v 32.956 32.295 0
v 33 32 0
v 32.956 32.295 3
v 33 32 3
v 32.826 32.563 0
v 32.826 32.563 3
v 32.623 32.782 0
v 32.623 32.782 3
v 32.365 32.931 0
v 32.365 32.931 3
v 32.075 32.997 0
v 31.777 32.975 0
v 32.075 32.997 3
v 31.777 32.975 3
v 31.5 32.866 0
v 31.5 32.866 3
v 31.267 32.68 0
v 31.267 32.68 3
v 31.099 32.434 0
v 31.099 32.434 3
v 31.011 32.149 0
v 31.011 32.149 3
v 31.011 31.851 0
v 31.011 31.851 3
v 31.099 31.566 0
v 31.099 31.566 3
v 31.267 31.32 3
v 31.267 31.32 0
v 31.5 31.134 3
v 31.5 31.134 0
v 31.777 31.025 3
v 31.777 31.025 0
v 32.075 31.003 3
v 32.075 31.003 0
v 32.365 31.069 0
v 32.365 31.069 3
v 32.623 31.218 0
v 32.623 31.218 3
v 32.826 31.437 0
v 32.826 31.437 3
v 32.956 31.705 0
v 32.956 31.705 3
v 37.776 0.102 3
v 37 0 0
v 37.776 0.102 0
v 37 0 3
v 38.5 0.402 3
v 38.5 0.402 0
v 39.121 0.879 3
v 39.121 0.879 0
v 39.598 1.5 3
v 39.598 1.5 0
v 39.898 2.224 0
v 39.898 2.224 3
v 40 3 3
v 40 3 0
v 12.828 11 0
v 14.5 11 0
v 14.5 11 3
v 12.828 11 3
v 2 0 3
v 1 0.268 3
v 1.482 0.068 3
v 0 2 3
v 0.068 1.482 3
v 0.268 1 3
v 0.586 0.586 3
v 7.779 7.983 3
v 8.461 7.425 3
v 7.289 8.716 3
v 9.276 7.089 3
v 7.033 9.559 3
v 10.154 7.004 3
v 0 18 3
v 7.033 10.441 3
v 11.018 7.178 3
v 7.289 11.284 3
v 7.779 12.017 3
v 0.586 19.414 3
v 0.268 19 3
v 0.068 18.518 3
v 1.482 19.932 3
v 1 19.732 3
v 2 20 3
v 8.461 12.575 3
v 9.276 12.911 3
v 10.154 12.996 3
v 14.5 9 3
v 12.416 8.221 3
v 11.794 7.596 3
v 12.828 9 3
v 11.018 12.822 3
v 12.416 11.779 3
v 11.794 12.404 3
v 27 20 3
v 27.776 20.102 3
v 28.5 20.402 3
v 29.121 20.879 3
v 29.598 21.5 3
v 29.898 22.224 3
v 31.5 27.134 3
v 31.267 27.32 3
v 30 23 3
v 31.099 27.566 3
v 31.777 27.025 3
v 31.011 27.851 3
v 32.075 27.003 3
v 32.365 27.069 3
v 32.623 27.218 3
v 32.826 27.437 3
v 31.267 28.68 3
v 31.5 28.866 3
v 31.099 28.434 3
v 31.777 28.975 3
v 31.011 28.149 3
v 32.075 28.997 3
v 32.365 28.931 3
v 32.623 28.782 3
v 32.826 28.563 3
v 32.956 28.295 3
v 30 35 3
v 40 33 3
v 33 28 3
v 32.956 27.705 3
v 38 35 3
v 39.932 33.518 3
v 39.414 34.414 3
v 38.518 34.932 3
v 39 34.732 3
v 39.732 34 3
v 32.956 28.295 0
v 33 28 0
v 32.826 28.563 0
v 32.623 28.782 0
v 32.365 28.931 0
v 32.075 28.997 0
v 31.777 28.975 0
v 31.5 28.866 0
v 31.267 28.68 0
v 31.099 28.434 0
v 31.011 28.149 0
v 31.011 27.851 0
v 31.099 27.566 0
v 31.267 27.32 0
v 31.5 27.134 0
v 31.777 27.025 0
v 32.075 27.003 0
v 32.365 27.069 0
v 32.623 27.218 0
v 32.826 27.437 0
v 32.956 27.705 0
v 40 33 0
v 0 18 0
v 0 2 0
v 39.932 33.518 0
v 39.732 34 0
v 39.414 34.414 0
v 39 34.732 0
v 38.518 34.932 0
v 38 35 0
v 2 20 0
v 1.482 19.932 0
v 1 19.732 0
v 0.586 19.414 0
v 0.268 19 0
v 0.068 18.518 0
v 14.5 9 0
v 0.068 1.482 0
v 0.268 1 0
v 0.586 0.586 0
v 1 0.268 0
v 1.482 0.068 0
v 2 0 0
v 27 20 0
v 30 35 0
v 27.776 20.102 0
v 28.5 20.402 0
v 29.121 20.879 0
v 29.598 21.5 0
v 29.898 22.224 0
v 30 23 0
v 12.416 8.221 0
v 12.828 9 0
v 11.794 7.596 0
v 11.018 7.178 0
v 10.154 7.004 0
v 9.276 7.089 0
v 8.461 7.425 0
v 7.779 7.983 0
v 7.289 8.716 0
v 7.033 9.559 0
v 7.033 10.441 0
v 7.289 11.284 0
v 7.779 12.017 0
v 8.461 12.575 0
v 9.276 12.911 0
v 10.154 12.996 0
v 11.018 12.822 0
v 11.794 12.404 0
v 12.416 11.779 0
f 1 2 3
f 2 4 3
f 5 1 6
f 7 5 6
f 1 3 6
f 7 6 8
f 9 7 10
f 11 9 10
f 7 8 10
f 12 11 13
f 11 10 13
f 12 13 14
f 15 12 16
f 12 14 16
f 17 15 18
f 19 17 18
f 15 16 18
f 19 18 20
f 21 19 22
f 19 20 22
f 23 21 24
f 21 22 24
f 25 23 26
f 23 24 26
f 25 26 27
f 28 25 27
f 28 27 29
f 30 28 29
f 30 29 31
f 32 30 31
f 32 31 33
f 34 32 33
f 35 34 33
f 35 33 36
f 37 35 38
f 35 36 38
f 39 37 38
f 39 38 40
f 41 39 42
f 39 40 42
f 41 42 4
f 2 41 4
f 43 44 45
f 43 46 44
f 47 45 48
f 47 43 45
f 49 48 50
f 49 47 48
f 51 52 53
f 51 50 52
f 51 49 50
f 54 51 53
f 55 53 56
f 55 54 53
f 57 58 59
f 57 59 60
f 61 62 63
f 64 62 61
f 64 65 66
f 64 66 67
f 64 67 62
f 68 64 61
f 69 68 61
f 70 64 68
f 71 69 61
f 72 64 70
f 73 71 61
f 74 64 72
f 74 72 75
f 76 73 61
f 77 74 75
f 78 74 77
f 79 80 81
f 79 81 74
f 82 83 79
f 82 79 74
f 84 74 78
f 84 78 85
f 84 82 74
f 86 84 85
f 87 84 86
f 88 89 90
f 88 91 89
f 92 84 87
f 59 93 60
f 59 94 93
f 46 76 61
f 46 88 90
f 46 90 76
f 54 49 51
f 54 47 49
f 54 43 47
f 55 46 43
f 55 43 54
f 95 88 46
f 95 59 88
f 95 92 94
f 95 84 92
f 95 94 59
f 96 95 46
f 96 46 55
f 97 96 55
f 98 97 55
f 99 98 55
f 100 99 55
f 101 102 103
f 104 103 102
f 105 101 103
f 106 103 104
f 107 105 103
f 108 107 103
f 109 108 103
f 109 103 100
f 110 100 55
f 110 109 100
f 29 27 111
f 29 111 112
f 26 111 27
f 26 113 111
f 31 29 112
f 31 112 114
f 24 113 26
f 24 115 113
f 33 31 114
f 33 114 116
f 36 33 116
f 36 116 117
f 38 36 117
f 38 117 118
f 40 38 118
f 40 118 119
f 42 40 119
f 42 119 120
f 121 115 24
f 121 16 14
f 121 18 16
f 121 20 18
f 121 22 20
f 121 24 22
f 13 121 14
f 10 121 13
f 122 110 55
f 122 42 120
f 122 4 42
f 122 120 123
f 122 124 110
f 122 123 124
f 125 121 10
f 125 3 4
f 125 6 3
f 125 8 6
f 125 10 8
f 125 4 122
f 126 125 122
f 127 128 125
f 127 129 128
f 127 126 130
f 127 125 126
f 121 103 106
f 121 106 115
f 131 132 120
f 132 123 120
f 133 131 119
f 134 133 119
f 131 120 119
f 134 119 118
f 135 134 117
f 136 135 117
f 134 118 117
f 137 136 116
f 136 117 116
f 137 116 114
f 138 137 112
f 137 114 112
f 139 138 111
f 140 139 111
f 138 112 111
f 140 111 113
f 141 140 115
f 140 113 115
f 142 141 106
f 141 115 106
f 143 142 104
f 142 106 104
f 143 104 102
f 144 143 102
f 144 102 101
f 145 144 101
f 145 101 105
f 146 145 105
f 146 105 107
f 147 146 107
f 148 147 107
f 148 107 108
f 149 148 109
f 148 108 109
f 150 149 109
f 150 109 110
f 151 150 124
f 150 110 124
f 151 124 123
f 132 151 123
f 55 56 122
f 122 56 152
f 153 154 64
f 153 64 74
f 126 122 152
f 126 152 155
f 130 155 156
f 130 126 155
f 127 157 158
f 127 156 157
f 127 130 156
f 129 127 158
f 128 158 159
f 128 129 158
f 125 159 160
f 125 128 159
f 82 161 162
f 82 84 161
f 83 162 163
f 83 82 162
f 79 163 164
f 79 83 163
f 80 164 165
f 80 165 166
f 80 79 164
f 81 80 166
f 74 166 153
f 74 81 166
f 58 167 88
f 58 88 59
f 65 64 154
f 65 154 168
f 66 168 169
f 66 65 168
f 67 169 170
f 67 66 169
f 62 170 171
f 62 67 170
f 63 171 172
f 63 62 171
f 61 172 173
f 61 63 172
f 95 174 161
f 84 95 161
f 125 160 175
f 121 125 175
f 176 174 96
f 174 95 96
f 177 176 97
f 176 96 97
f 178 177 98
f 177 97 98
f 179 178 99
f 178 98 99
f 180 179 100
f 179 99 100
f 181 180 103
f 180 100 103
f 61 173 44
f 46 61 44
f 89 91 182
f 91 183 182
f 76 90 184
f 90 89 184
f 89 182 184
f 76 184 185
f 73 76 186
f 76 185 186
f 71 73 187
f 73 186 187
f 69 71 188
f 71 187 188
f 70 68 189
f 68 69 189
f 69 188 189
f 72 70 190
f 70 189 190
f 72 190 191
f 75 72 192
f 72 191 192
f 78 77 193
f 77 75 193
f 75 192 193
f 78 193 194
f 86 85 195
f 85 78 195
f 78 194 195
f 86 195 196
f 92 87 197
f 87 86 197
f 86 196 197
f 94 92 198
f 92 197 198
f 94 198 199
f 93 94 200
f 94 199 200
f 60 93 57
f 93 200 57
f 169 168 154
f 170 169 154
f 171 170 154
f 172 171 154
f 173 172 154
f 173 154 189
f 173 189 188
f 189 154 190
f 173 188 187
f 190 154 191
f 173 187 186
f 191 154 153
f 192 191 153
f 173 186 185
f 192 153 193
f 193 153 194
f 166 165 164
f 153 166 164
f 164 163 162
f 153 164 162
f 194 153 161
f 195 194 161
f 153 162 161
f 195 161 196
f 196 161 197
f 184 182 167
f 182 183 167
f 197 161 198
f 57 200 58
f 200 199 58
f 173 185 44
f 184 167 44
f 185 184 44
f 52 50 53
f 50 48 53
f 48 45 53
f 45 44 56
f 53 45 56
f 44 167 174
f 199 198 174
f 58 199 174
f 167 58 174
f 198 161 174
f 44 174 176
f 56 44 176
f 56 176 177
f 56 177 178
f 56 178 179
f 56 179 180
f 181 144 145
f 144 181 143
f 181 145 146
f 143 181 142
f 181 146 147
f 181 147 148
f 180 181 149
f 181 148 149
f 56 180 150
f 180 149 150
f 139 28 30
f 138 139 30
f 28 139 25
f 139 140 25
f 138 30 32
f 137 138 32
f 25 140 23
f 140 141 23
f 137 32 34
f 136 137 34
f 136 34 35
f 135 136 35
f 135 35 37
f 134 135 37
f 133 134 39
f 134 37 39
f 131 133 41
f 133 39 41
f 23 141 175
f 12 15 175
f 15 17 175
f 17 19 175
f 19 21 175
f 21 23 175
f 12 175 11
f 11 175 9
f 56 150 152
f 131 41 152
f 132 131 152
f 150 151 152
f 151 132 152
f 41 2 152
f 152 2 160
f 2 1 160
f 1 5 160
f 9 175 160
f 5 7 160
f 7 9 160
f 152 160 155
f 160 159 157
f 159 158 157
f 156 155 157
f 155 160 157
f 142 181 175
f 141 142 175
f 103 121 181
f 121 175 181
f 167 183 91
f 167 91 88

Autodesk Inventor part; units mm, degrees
ref_plane "YZ Plane" through (0, 0, 0) normal (1, 0, 0) x (0, 1, 0)
ref_plane "XZ Plane" through (0, 0, 0) normal (0, 1, 0) x (-1, 0, 0)
ref_plane "XY Plane" through (0, 0, 0) normal (0, 0, 1) x (1, 0, 0)
sketch "スケッチ1" plane through (0, 0, 0) normal (0, 0, 1) x (1, 0, 0)
  line L0 (0, 0) -> (0, 20)
  line L1 (0, 0) -> (40, 0)
  line L2 (40, 0) -> (40, 35)
  line L3 (40, 35) -> (30, 35)
  line L4 (30, 35) -> (30, 20)
  line L5 (30, 20) -> (0, 20)
  circle A0 centre (10, 10) radius 3
  line L6 (10, 10) -> (10, 9)
  line L7 (10, 10) -> (10, 11)
  line L8 (10, 9) -> (14.5, 9)
  line L9 (14.5, 9) -> (14.5, 11)
  line L10 (14.5, 11) -> (10, 11)
  point P0 (12.8284, 9)
  point P1 (12.8284, 11)
  dimension "d0" = 20
  dimension "d1" = 40
  dimension "d2" = 35
  dimension "d3" = 10
  dimension "d4" = 6
  dimension "d6" = 1
  dimension "d7" = 1
  dimension "d8" = 4.5
extrude "押し出し1" add sketch "スケッチ1" along normal blind 3
fillet "フィレット1" radius 3 2 edges at (30, 20, 1.5) (40, 0, 1.5)
fillet "フィレット2" radius 2 2 edges at (0, 20, 1.5) (0, 0, 1.5)
fillet "フィレット3" radius 2 1 edges at (40, 35, 1.5)
sketch "スケッチ3" plane through (0, 0, 3) normal (0, 0, 1) x (1, 0, 0)
  circle A0 centre (32, 28) radius 1
  circle A1 centre (32, 32) radius 1
  point P0 (0, 0)
  dimension "d23" = 2
  dimension "d24" = 2
extrude "押し出し3" cut sketch "スケッチ3" against normal blind 10
thread "ねじ3" size "M2x0.4" class "6H" standard "ANSI Metric M Profile" full length
thread "ねじ4" size "M2x0.4" class "6H" standard "ANSI Metric M Profile" full length
properties part number "cutter_holder" material "アルミニウム 7075"
